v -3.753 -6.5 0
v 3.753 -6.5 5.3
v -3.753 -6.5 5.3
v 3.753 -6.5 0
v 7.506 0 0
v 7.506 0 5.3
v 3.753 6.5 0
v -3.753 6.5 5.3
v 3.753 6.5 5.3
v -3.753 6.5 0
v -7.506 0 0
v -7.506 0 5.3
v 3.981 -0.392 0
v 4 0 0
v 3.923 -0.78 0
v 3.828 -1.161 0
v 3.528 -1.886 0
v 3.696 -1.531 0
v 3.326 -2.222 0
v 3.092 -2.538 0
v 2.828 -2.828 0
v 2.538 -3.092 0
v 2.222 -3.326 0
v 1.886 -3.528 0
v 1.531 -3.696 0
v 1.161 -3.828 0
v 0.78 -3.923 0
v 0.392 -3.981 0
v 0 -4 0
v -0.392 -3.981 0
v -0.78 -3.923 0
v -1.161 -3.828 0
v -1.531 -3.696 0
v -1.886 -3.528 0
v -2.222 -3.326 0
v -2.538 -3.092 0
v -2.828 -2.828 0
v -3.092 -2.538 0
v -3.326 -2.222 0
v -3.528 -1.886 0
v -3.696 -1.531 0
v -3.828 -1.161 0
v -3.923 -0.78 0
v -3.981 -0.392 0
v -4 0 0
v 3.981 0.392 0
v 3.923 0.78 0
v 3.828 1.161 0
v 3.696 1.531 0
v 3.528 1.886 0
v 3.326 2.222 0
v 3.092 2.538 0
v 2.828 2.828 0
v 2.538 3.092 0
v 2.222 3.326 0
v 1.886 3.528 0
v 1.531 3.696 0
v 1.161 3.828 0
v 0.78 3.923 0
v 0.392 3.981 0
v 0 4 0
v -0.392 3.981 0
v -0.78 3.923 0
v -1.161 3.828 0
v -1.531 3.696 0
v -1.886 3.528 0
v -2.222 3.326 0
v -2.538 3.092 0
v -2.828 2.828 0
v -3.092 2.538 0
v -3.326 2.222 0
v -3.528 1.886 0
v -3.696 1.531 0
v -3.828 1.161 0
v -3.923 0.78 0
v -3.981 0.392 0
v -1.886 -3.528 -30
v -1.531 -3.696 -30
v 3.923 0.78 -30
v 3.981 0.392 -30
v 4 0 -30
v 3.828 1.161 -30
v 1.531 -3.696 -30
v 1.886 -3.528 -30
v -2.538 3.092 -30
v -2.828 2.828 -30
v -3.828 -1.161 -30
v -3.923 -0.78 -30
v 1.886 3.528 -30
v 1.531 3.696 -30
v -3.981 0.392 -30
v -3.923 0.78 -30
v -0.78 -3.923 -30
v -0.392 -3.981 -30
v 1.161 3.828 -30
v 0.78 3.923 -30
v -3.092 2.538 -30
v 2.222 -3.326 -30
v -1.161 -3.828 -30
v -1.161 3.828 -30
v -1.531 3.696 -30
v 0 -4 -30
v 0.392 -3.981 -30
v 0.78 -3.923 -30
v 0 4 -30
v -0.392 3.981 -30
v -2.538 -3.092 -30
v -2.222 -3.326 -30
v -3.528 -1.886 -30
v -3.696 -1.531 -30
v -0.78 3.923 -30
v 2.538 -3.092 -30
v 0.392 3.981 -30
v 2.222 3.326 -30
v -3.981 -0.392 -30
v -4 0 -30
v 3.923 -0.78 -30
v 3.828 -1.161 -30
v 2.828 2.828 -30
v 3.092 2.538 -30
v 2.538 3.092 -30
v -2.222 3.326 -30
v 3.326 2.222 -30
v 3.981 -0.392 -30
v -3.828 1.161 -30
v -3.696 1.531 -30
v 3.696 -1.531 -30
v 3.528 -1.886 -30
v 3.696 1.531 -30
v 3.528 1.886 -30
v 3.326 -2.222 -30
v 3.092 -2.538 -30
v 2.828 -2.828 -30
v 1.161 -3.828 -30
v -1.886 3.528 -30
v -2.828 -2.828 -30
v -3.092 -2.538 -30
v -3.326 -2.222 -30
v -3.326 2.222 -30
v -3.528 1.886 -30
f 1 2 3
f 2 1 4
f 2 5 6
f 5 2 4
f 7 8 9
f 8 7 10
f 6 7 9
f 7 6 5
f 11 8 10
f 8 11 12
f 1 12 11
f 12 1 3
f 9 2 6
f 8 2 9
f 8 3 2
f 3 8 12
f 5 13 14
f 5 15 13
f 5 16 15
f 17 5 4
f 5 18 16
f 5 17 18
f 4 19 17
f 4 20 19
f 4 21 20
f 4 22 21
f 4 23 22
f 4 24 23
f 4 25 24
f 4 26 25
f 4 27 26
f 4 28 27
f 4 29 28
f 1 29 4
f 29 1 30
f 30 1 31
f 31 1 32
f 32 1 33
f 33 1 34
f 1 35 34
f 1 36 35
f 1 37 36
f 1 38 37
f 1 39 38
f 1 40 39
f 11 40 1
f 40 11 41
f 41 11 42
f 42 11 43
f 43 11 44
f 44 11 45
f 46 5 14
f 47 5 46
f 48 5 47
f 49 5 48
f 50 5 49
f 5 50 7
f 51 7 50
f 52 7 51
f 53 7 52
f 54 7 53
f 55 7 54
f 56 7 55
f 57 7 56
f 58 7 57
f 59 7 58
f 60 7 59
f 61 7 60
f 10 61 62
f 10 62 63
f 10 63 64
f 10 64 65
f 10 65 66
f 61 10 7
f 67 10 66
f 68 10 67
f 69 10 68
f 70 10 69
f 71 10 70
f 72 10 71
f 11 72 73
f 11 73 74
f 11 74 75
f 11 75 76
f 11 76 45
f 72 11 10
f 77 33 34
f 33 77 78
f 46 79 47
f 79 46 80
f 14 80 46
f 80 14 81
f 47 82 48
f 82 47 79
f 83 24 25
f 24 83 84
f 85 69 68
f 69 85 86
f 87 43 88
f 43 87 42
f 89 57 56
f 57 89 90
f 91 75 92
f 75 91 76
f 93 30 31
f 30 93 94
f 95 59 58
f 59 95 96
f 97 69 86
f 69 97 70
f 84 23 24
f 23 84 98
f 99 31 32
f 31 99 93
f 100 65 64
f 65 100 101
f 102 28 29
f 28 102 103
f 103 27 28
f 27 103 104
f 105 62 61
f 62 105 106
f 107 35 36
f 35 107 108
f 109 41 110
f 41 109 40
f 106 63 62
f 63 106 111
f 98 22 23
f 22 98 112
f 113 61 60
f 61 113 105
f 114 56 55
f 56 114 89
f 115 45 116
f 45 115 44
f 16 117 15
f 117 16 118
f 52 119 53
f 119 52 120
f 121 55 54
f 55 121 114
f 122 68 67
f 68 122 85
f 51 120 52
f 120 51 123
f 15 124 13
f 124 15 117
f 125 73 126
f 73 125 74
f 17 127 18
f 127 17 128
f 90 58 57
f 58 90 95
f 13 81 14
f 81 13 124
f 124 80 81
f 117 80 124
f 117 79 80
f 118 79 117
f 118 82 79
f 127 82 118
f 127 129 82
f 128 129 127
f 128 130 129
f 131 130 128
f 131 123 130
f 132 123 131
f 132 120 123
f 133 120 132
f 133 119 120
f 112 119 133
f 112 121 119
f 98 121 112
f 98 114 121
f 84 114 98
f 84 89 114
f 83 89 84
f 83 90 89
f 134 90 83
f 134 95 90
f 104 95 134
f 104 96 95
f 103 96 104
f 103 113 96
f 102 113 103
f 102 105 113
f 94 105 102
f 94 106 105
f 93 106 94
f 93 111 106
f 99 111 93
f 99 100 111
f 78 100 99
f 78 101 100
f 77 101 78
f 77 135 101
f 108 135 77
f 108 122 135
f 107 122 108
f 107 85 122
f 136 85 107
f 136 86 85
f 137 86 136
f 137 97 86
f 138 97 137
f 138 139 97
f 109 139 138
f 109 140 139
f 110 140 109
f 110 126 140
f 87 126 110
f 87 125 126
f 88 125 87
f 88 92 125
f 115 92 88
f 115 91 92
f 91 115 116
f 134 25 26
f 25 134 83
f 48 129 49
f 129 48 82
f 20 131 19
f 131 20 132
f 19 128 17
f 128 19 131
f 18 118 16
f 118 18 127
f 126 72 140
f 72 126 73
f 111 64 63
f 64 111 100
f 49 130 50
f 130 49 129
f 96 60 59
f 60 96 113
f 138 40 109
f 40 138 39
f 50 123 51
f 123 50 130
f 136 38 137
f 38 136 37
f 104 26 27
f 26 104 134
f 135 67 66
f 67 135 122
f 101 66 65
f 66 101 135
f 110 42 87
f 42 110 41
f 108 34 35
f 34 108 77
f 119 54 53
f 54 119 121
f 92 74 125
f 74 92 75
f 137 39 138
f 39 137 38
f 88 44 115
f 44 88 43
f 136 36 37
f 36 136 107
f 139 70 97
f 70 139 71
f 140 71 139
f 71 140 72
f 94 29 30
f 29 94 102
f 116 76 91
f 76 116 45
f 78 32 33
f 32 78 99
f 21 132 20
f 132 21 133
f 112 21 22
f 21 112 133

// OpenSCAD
$fn = 64;

// 頭部 (対辺13mm, 高さ5.3mm)
// z = 0 から z = 5.3 へ配置
cylinder(h = 5.3, r = (13 / 2) / cos(30), $fn = 6);

// シャンク (直径8mm, 長さ30mm)
// z = 0 から z = -30 へ配置
translate([0, 0, -30])
    cylinder(h = 30, d = 8);
